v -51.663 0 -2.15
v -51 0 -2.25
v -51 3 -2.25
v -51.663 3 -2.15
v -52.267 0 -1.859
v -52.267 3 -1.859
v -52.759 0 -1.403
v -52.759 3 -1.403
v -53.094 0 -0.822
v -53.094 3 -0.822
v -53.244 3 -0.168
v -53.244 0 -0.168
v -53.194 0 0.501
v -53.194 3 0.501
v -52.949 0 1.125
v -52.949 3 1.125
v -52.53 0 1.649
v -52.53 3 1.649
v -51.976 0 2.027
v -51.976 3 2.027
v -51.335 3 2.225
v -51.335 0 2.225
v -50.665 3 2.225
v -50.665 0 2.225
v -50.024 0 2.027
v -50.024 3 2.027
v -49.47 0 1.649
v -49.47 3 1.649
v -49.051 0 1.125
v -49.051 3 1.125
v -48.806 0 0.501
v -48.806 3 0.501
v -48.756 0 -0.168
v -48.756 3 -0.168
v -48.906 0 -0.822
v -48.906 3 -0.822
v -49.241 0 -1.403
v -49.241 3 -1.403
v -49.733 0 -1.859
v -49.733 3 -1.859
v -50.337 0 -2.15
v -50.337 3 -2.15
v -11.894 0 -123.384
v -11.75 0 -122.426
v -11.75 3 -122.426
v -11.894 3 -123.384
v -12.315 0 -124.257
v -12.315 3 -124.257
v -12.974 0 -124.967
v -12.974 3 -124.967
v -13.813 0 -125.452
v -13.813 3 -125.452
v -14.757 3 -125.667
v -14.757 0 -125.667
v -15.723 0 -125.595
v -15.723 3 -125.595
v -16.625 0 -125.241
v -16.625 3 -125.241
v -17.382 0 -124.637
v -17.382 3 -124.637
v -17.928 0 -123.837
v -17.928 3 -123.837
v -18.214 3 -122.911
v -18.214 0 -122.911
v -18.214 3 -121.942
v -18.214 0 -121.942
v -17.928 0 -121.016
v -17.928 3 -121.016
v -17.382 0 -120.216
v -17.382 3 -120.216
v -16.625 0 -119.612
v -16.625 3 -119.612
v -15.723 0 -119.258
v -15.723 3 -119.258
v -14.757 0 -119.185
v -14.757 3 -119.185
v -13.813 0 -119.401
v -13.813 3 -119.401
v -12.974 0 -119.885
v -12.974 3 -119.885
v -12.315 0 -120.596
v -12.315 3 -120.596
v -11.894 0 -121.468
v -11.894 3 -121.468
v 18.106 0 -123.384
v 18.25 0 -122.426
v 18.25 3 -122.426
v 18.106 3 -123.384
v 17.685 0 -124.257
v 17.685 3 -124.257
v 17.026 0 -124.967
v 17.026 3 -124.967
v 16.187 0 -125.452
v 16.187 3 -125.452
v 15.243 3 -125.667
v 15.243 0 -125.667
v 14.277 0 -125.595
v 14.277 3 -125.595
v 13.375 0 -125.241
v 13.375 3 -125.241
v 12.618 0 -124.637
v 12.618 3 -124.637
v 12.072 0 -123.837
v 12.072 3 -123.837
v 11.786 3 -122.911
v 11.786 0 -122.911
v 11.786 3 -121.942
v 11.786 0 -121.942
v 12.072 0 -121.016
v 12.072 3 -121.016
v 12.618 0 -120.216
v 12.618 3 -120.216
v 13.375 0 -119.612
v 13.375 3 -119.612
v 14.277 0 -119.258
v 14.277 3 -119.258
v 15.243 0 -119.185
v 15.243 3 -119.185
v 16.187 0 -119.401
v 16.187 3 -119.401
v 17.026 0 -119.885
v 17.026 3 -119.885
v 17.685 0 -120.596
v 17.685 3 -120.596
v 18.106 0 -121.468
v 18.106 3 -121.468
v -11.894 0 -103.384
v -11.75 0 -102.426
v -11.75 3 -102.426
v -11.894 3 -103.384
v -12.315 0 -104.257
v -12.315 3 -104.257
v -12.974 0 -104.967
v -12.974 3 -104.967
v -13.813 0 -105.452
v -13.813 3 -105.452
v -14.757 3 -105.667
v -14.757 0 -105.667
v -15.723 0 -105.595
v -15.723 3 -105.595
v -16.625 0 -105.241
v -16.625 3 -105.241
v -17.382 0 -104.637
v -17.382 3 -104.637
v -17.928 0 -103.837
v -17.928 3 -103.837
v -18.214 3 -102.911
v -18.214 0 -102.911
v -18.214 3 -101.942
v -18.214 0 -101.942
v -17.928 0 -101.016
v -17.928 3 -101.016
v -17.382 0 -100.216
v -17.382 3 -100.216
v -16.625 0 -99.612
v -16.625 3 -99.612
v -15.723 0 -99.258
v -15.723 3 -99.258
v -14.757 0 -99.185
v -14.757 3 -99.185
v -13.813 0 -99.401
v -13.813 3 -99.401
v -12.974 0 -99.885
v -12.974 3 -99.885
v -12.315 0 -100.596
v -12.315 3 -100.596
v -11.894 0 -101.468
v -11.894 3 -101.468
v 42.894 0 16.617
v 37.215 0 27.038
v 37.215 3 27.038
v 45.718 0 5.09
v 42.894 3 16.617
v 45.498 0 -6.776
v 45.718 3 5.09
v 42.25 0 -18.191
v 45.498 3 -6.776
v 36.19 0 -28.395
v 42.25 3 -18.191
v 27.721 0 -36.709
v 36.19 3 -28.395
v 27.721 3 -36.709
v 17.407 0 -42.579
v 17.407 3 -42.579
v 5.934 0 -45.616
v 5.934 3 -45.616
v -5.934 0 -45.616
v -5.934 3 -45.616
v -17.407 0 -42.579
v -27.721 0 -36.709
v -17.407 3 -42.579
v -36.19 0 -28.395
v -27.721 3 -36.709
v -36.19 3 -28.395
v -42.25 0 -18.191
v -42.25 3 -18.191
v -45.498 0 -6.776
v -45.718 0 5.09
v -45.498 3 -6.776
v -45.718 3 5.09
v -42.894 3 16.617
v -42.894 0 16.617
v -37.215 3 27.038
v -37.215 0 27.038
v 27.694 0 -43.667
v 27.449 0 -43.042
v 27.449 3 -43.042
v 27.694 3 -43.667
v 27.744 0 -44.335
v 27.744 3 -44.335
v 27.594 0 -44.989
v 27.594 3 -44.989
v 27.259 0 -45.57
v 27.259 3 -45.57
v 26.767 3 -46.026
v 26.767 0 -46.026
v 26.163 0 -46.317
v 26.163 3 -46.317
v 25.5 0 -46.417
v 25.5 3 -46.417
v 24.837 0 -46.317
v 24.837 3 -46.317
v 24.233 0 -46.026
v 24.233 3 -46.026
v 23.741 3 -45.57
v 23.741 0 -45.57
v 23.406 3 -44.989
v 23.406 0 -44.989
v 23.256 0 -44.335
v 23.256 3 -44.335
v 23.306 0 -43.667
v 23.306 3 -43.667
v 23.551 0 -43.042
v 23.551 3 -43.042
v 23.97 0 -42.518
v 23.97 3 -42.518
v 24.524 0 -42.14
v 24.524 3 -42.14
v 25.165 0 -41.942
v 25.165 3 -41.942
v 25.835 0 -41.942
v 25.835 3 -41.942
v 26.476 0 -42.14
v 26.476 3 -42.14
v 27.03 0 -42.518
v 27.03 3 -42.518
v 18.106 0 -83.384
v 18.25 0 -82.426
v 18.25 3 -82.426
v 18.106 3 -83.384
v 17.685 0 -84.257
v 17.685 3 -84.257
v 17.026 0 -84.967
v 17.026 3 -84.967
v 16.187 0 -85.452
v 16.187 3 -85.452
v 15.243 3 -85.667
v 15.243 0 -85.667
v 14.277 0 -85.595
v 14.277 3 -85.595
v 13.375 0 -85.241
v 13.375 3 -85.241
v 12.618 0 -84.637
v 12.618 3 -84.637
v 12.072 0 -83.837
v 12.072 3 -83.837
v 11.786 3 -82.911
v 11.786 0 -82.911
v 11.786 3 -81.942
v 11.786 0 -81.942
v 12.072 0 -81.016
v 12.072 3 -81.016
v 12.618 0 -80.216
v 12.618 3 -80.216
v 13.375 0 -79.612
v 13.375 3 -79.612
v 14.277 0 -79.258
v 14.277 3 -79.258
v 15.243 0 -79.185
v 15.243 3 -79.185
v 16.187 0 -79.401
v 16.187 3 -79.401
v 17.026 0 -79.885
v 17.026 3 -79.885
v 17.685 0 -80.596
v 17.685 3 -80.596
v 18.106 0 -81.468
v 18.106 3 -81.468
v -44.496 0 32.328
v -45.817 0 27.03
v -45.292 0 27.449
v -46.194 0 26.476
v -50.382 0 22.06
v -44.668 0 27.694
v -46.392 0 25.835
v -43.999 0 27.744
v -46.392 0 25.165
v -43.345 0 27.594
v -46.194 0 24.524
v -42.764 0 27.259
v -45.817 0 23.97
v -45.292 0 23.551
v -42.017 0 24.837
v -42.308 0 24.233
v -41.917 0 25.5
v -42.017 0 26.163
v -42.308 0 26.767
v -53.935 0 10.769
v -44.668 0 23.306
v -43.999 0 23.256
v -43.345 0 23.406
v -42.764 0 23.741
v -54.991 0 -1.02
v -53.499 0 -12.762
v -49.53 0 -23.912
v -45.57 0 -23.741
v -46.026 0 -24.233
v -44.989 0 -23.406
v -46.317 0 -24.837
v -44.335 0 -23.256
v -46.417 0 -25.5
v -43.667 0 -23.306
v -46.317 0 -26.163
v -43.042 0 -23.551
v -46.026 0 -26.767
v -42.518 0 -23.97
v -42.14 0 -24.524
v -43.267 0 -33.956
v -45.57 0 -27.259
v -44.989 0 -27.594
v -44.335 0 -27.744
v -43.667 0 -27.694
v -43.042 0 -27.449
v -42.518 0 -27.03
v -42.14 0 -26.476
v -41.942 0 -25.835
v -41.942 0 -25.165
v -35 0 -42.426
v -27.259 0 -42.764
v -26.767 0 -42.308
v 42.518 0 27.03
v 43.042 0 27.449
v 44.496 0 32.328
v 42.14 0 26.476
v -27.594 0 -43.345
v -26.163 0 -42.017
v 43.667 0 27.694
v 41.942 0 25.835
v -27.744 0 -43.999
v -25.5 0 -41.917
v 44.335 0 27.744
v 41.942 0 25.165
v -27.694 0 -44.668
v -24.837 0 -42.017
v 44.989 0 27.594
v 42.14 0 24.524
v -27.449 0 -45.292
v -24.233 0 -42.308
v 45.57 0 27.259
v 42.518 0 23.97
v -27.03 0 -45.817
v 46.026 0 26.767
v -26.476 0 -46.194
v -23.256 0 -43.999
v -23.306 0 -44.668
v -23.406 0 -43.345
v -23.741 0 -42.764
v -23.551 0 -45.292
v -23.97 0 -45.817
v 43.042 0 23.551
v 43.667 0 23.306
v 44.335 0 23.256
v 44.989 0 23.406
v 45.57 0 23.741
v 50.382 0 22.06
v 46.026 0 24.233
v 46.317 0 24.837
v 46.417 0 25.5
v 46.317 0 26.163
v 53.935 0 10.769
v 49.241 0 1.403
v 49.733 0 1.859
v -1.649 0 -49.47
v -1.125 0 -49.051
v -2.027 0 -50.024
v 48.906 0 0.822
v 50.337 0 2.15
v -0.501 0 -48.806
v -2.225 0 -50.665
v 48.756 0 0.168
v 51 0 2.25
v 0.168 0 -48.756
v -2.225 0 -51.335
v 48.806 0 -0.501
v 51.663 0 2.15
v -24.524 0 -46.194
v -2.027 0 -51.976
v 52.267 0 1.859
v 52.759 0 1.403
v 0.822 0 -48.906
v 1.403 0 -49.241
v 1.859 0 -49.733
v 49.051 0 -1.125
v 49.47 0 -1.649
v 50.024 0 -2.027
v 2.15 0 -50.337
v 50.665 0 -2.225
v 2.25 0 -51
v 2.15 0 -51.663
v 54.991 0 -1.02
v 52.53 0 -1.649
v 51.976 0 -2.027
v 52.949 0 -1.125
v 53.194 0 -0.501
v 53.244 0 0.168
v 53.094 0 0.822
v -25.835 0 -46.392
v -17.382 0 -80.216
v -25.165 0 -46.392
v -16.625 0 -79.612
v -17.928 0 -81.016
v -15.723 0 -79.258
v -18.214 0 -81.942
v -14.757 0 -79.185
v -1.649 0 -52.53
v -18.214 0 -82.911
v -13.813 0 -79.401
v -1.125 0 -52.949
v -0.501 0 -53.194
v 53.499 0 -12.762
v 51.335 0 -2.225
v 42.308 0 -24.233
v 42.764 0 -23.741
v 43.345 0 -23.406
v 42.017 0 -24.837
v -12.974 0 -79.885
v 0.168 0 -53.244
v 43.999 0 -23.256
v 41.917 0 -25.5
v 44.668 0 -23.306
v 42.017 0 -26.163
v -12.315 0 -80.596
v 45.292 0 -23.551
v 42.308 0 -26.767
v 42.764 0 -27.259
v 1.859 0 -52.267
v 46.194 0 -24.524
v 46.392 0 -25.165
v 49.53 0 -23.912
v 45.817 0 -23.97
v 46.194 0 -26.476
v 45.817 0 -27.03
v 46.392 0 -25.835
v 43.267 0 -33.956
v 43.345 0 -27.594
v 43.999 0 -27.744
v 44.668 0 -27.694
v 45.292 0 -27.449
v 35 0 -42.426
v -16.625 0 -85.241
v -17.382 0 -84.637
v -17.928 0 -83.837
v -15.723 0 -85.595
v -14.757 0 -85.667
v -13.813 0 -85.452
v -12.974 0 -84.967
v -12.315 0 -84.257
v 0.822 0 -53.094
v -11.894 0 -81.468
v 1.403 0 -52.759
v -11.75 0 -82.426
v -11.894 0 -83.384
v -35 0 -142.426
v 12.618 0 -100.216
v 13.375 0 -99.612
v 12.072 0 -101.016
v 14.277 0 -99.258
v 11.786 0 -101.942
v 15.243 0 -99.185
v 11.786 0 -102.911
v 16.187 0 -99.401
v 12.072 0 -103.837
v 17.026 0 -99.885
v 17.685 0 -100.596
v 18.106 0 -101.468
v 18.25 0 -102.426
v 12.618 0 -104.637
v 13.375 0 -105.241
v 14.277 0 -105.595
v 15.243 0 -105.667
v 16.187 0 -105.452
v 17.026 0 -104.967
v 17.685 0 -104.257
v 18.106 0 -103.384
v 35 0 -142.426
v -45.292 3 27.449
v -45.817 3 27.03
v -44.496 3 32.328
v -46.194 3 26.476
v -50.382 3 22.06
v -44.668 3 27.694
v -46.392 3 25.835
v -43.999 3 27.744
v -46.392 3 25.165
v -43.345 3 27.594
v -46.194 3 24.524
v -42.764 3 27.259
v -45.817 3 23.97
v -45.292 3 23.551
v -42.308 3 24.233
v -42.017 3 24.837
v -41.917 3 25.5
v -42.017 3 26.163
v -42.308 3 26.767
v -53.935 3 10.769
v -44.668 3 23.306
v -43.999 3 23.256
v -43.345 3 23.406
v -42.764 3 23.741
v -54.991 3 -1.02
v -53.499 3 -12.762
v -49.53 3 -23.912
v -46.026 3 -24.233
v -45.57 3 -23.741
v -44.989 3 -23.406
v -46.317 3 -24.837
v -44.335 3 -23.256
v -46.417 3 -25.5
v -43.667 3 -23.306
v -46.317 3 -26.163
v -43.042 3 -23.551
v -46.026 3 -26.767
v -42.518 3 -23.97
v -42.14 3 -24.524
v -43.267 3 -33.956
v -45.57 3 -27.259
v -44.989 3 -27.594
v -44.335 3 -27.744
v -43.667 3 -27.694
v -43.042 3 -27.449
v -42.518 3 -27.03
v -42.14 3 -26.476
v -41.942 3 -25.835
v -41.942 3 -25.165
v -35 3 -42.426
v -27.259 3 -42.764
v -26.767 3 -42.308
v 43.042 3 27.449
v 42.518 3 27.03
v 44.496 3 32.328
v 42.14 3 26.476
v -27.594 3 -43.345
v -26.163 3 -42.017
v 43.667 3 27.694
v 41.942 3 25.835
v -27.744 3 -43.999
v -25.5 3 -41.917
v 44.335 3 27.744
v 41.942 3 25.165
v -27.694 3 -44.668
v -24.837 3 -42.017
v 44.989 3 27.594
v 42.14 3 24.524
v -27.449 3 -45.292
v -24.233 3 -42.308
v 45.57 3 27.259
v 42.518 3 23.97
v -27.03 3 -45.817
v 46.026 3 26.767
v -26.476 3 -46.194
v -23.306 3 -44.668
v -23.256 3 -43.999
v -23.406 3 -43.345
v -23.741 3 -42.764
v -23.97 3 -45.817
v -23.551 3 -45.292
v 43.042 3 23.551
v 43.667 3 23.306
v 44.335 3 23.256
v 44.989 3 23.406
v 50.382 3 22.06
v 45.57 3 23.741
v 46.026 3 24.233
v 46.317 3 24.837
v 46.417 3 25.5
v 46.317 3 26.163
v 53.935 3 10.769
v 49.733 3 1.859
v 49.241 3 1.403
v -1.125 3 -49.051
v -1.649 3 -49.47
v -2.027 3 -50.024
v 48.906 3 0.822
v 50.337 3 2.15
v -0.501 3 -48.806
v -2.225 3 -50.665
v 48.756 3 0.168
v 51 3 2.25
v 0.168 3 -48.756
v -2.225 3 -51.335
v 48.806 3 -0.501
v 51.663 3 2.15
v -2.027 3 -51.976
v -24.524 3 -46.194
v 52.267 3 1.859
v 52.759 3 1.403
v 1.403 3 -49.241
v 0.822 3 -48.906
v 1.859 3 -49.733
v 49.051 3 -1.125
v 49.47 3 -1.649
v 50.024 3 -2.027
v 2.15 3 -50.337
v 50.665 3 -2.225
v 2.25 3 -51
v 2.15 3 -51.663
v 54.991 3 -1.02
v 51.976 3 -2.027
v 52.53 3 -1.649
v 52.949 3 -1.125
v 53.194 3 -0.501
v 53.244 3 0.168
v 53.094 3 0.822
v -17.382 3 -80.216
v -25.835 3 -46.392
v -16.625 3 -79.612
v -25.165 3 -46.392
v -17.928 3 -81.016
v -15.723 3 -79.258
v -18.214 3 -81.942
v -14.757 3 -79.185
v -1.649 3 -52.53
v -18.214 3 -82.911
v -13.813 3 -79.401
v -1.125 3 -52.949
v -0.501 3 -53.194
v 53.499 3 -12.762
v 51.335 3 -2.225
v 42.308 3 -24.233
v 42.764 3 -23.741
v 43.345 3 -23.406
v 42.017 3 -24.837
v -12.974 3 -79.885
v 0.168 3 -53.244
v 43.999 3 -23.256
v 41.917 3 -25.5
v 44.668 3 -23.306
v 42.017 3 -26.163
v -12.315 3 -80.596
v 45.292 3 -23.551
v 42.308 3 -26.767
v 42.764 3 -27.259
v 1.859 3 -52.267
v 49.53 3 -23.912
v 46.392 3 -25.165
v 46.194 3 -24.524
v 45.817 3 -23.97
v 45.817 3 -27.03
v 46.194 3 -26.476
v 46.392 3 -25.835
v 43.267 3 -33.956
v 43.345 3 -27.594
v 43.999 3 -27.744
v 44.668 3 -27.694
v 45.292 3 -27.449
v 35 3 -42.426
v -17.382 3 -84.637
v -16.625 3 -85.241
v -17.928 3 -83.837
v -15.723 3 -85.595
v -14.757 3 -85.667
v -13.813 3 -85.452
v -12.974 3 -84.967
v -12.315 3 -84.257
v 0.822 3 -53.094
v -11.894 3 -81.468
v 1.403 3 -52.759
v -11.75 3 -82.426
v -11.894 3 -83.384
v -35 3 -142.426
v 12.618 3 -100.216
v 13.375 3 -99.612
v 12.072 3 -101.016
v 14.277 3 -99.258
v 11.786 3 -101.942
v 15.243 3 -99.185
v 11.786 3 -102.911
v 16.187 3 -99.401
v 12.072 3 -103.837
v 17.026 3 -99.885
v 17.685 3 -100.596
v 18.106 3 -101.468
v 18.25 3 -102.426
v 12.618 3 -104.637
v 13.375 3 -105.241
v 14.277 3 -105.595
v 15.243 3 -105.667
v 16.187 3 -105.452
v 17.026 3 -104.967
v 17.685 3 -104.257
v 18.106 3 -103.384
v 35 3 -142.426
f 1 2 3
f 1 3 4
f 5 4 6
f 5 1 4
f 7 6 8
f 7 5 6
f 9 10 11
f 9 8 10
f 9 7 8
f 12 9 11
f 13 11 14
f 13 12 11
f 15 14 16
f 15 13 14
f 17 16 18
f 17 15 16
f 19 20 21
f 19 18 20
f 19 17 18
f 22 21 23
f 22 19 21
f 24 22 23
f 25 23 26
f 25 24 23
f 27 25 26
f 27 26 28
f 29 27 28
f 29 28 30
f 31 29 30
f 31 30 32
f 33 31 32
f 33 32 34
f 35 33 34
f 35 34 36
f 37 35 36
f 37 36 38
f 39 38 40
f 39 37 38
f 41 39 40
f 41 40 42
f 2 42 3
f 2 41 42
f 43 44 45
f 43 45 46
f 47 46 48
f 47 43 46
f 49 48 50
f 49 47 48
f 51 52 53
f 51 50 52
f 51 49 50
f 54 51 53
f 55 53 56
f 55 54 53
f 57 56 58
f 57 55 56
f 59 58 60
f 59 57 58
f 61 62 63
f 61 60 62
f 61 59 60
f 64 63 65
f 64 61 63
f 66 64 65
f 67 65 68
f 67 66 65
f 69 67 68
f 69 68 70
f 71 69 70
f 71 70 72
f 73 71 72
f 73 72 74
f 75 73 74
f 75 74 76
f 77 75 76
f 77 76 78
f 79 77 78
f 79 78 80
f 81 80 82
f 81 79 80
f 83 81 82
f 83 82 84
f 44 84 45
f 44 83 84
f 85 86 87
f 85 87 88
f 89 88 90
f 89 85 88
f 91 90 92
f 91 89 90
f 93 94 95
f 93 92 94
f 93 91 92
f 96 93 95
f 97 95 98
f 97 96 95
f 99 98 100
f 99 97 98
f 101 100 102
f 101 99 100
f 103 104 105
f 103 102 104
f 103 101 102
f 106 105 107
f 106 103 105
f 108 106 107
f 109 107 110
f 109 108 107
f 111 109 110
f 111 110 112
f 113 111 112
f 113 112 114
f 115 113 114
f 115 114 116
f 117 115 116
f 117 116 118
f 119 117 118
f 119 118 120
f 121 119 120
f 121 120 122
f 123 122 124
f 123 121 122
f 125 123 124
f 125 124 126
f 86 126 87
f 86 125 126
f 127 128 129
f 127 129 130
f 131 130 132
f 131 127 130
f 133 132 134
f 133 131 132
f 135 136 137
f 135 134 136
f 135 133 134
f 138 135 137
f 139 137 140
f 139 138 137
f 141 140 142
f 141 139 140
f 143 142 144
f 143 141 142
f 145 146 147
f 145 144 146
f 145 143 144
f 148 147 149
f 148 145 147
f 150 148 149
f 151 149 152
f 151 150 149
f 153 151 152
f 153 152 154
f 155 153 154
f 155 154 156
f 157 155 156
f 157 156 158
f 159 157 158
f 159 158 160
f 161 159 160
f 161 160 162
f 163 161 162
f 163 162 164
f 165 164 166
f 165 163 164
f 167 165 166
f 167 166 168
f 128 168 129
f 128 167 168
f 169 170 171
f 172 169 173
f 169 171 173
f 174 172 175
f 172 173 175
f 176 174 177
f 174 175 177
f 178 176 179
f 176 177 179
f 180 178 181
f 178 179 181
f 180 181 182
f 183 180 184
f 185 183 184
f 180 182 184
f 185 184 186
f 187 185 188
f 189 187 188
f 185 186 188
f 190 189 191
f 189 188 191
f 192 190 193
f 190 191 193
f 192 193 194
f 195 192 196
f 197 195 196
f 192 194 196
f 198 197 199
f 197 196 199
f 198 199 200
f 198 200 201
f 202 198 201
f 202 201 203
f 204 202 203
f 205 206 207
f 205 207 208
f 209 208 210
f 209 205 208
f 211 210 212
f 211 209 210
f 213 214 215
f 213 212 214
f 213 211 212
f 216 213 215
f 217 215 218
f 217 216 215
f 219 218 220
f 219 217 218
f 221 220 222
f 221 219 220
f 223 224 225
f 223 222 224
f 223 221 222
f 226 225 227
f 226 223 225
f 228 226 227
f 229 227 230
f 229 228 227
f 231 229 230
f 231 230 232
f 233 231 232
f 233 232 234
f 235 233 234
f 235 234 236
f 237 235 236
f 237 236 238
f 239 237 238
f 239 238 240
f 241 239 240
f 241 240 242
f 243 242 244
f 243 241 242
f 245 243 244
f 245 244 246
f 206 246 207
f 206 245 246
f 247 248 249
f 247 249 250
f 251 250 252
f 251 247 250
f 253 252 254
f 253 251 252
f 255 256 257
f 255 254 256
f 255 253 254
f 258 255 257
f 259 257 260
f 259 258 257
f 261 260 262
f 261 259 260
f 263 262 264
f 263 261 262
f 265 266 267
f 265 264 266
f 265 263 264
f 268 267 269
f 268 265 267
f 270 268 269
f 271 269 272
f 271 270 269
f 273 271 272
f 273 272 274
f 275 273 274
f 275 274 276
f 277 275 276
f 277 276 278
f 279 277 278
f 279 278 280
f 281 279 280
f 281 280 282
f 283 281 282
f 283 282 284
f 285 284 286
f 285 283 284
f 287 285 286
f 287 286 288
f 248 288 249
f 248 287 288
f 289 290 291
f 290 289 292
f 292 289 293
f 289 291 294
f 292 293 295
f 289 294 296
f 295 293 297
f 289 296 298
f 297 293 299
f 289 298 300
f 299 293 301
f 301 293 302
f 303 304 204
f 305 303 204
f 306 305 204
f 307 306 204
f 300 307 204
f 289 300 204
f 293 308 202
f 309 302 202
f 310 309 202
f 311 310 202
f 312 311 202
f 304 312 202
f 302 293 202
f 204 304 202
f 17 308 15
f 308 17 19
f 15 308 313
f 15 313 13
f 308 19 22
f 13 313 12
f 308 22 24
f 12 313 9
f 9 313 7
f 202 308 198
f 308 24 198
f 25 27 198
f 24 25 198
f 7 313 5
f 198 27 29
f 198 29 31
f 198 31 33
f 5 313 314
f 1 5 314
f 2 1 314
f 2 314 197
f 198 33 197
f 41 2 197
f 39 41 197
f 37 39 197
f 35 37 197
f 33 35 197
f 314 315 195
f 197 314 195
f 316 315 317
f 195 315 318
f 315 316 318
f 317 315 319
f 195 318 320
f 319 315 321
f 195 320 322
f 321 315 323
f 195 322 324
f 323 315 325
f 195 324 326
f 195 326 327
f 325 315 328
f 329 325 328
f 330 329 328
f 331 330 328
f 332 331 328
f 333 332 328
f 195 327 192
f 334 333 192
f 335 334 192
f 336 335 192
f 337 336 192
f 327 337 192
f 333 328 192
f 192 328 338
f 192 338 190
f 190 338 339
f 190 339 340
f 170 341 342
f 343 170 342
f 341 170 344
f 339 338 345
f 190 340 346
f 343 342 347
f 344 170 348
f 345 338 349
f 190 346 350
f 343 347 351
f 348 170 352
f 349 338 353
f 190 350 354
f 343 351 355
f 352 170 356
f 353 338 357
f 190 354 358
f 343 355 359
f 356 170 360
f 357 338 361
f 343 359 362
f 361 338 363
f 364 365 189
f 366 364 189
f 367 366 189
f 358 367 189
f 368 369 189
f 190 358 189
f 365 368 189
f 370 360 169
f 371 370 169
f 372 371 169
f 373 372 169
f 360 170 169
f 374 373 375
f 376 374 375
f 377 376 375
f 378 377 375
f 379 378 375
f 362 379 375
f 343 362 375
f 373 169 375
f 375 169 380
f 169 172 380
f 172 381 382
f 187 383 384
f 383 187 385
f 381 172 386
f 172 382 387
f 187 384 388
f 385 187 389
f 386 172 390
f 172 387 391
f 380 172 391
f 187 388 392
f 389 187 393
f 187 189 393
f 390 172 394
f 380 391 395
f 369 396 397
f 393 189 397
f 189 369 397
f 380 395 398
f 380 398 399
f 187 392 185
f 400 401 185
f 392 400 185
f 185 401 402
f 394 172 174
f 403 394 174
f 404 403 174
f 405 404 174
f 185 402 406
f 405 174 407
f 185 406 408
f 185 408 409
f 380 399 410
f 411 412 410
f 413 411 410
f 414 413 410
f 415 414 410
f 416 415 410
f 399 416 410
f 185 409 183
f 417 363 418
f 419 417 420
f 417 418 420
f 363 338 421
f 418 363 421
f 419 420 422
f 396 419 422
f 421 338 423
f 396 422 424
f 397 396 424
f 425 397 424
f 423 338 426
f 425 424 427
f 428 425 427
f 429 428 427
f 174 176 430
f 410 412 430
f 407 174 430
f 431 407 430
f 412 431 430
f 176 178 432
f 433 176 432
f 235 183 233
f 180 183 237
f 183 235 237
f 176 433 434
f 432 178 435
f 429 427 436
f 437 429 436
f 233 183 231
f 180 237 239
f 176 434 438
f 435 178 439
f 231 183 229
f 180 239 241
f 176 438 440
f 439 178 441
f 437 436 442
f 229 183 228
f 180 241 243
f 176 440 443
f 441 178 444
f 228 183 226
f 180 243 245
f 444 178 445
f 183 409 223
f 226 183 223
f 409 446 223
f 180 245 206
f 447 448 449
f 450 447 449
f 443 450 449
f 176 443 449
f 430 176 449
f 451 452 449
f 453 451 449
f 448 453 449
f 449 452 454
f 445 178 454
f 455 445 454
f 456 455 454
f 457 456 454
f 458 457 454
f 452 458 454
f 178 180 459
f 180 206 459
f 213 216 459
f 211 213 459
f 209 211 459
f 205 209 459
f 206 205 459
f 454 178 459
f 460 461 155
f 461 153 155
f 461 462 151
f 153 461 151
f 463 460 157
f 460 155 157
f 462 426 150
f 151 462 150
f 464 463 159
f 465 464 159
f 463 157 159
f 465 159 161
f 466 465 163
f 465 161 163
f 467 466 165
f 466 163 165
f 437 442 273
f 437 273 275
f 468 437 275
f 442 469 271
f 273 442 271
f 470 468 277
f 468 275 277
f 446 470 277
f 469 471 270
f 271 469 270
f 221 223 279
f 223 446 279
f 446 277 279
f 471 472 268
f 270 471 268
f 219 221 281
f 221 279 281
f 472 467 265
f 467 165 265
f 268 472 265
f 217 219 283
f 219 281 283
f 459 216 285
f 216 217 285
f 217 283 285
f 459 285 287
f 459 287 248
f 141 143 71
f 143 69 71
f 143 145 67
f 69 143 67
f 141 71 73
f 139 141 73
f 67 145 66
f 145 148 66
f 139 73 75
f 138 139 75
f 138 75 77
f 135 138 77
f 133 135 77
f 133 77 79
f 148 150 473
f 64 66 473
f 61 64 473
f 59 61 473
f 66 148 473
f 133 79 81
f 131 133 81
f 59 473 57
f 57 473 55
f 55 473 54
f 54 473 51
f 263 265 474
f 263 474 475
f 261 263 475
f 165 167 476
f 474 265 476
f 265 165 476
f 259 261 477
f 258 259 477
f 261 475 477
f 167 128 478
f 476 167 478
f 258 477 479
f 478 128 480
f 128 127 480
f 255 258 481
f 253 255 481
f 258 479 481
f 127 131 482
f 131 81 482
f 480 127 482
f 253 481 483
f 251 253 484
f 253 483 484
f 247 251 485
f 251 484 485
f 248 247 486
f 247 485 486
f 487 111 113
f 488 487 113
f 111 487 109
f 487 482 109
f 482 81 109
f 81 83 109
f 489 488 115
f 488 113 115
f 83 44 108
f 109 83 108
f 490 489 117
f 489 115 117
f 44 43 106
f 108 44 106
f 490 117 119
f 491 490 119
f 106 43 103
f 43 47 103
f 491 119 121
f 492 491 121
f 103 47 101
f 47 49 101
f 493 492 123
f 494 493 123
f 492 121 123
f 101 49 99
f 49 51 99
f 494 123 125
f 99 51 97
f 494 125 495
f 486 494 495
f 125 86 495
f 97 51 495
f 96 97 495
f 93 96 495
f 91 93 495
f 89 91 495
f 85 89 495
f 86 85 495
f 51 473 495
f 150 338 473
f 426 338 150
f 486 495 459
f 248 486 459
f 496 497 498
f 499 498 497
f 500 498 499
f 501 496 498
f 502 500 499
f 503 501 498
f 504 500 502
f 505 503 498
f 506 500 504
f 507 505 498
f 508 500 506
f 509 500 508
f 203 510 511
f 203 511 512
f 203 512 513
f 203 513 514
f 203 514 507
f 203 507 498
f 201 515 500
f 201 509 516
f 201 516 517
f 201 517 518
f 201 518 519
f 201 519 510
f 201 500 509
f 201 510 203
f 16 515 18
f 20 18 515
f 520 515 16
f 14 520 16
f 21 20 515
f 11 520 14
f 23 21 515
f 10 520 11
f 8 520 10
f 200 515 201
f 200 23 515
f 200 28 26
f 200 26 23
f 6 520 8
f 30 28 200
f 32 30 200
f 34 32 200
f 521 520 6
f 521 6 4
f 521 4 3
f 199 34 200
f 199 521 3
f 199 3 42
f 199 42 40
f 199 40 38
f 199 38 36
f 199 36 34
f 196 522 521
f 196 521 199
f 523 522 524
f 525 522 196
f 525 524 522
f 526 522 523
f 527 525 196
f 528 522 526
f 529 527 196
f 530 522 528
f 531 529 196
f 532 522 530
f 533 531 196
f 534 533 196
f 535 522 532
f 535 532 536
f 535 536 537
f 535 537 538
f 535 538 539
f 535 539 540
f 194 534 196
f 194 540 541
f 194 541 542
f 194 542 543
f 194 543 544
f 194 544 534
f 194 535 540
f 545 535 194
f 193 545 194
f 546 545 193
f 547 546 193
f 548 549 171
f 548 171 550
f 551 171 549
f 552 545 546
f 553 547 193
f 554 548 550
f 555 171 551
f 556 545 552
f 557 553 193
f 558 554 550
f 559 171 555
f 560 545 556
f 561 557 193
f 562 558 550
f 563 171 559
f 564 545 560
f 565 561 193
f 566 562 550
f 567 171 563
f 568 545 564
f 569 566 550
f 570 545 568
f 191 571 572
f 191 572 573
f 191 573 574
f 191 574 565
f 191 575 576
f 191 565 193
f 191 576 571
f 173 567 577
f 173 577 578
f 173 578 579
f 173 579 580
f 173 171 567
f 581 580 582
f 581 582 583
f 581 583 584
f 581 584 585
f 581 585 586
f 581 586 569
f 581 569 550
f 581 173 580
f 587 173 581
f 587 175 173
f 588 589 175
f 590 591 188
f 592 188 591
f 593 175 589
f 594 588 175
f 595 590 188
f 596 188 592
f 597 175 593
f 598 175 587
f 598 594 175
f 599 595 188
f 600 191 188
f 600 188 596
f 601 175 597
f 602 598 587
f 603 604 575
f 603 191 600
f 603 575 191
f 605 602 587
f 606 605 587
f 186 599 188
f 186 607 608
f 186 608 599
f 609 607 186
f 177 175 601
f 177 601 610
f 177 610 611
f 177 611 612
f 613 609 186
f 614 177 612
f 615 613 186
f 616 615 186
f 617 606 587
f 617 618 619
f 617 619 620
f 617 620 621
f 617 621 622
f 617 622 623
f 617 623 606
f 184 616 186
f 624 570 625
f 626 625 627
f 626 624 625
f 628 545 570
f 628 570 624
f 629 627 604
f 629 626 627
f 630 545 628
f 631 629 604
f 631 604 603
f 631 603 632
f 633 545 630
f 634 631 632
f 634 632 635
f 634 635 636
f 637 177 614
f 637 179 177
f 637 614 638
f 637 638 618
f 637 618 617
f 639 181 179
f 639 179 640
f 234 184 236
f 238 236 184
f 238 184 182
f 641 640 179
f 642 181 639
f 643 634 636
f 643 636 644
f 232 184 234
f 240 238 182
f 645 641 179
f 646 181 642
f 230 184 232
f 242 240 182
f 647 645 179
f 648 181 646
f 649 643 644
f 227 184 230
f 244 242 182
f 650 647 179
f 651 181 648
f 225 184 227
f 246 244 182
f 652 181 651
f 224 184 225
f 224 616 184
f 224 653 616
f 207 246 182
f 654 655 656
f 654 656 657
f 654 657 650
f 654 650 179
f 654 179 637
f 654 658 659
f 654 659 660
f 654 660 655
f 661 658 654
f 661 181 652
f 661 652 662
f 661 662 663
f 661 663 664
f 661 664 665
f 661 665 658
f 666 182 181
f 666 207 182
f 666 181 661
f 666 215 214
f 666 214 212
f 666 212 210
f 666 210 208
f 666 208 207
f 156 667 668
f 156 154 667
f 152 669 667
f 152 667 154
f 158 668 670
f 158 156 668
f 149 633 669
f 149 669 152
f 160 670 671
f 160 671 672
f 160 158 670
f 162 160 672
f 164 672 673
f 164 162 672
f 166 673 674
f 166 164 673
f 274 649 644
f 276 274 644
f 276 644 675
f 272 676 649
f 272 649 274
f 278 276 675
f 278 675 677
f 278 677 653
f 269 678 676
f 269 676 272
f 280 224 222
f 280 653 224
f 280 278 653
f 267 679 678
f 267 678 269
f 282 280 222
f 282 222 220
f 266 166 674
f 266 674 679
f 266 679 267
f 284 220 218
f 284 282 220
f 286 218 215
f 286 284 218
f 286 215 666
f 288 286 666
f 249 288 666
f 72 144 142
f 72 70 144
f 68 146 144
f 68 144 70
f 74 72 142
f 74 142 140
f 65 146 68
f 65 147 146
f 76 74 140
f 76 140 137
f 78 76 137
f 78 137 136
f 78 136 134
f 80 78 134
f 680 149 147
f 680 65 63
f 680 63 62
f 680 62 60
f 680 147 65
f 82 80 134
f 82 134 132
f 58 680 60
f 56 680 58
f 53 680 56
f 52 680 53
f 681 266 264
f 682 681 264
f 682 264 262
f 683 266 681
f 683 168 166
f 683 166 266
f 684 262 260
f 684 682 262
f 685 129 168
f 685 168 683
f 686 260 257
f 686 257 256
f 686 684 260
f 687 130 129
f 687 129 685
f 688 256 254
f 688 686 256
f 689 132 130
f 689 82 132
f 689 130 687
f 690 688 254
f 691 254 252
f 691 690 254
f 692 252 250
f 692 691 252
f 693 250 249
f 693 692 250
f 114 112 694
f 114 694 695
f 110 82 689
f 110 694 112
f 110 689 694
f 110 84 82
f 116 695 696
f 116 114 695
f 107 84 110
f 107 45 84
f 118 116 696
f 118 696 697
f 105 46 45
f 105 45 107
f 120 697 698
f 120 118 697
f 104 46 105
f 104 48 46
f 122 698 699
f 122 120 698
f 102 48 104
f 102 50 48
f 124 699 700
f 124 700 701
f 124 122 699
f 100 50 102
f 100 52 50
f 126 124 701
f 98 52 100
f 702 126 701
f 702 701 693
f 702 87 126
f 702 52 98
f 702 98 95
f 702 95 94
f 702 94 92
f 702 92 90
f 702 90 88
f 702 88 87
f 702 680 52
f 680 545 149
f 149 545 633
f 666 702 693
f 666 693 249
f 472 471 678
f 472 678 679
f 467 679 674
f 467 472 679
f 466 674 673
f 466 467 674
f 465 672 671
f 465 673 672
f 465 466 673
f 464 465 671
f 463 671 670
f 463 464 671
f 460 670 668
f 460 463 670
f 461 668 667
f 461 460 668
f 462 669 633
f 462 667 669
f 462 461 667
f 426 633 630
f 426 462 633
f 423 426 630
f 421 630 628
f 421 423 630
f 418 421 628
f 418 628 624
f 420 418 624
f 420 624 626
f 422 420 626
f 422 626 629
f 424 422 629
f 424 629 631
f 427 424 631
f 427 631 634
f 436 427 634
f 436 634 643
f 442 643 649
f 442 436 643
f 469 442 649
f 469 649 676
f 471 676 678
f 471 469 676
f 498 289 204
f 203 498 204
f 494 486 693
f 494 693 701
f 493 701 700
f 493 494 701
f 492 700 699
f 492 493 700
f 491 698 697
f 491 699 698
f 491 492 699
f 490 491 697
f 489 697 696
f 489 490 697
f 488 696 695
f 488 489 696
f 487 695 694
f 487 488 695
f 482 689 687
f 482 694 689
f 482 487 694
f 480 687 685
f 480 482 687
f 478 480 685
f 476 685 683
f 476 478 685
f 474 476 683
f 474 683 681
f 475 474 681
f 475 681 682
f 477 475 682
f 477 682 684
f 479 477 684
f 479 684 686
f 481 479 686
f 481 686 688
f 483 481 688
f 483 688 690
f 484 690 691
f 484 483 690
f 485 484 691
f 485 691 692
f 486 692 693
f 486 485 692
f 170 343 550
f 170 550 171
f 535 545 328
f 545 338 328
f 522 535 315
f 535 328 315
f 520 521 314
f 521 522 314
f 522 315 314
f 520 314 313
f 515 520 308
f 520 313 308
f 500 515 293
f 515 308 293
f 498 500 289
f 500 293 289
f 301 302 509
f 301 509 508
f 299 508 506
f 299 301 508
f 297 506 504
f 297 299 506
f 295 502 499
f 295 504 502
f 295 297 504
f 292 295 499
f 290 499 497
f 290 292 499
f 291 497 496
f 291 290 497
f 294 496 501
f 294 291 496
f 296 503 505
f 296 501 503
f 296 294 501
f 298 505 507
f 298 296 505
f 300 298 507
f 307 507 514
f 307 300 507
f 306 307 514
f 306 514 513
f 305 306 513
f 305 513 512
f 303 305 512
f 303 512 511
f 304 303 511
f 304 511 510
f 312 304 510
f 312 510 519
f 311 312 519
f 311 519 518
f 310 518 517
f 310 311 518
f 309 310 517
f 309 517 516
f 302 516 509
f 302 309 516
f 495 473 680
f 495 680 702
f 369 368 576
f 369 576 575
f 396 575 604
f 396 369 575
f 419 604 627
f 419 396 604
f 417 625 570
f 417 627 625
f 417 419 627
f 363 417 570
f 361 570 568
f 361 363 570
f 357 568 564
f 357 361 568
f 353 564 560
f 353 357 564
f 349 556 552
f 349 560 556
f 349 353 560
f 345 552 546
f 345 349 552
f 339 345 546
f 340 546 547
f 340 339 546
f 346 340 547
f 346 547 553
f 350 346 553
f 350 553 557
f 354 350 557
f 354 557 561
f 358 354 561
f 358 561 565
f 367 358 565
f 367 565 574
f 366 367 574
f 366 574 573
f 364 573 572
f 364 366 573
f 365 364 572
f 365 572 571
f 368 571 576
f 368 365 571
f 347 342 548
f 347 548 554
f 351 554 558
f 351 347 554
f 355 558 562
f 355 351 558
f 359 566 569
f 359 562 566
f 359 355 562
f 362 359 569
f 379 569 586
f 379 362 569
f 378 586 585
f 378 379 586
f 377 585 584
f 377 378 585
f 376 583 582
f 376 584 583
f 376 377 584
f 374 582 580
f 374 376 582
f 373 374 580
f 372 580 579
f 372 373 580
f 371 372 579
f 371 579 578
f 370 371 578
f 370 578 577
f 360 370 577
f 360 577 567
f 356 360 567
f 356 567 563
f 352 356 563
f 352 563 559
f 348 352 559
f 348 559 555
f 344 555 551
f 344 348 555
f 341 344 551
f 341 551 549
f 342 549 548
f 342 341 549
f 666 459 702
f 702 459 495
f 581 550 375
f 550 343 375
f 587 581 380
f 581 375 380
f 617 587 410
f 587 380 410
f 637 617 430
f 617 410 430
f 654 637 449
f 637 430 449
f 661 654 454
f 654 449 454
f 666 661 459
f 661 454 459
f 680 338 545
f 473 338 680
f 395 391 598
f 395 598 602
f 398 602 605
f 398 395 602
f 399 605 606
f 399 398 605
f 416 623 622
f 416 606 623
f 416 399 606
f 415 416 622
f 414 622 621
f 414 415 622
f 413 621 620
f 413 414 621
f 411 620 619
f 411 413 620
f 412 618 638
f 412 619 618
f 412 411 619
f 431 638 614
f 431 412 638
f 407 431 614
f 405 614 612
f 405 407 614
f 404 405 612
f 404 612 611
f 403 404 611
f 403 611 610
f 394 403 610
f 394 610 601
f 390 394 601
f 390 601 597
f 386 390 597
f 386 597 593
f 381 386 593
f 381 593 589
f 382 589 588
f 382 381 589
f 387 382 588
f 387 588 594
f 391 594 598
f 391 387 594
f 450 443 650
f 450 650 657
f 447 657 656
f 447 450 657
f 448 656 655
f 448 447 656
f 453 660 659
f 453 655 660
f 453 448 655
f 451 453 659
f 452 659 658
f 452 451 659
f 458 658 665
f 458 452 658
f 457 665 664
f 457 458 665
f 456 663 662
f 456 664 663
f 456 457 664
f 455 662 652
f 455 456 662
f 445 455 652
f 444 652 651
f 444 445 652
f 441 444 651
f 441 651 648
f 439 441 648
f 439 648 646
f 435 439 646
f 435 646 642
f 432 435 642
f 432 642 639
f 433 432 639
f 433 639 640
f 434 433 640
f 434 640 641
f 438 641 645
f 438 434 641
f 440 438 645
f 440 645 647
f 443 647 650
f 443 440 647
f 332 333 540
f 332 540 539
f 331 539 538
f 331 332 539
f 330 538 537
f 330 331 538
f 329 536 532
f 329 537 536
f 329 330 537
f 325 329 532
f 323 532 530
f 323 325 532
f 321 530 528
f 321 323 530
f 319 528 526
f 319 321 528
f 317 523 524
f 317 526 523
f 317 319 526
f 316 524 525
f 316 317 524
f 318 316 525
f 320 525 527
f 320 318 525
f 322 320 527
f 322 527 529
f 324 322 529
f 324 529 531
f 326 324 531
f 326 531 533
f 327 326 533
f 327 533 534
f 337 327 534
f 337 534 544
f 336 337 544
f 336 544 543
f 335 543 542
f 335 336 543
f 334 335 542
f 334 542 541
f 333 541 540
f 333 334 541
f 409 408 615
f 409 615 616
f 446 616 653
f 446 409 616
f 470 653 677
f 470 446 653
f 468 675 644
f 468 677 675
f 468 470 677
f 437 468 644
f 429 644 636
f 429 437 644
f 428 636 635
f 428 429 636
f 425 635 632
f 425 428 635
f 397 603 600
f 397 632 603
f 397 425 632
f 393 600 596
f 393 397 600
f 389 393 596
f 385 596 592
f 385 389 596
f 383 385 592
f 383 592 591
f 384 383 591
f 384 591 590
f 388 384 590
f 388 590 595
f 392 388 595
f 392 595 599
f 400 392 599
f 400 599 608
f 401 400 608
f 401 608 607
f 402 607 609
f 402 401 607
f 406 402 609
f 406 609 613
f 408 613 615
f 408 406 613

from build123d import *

# Parameters (mm, degrees)
SKETCH1_R               = 55
BOSS_EXTRUDE1_DEPTH     = 3
SKETCH2_W               = 70
SKETCH2_H               = 100
BOSS_EXTRUDE2_DEPTH     = 3
SKETCH4_R               = 46
CUT_EXTRUDE2_DEPTH      = 1
CUT_EXTRUDE2_DEPTH_BACK = 4
CUT_EXTRUDE5_START      = -4
CUT_EXTRUDE5_DEPTH      = 5
CUT_EXTRUDE3_START      = -4
SKETCH5_R               = 2.25
CUT_EXTRUDE3_DEPTH      = 5
CIRPATTERN1_COUNT       = 12
CUT_EXTRUDE4_START      = -4
SKETCH6_R               = 3.25
CUT_EXTRUDE4_DEPTH      = 5
LPATTERN1_COUNT         = 3
LPATTERN1_PITCH         = 20


with BuildPart() as part:
    # Sketch1 → Boss-Extrude1 (new body)
    with BuildSketch(Plane(origin=(0, 0, 0), x_dir=(1, 0, 0), z_dir=(0, 1, 0))):
        Circle(SKETCH1_R)
    extrude(amount=BOSS_EXTRUDE1_DEPTH)

    # Sketch2 → Boss-Extrude2 (add)
    with BuildSketch(Plane(origin=(0, 0, 0), x_dir=(1, 0, 0), z_dir=(0, 1, 0))):
        with Locations((0, 92.426406871)):
            Rectangle(SKETCH2_W, SKETCH2_H)
    extrude(amount=BOSS_EXTRUDE2_DEPTH)

    # Sketch4 → Cut-Extrude2 (cut, two sides)
    with BuildSketch(Plane(origin=(0, 3, 0), x_dir=(1, 0, 0), z_dir=(0, 1, 0))) as cut_extrude2_sk:
        Circle(SKETCH4_R)
    extrude(amount=CUT_EXTRUDE2_DEPTH, mode=Mode.SUBTRACT)
    extrude(cut_extrude2_sk.sketch, amount=-CUT_EXTRUDE2_DEPTH_BACK, mode=Mode.SUBTRACT)

    # Sketch7 → Cut-Extrude5 (cut)
    with BuildSketch(Plane(origin=(0, 3, 0), x_dir=(1, 0, 0), z_dir=(0, 1, 0)).offset(CUT_EXTRUDE5_START)):
        with BuildLine():
            Line((0, 0), (0, -55))
            ThreePointArc((0, -55), (-24.969477486, -49.00535883), (-44.495934691, -32.328188876))
            Line((-44.495934691, -32.328188876), (0, 0))
        make_face()
    cut_extrude5 = extrude(amount=CUT_EXTRUDE5_DEPTH, mode=Mode.SUBTRACT)

    # Mirror1: Cut-Extrude5 across plane
    add(cut_extrude5.mirror(Plane(origin=(0, 0, 0), x_dir=(0, 0, 1), z_dir=(1, 0, 0))), mode=Mode.SUBTRACT)

    # Sketch5 → Cut-Extrude3 (cut)
    with BuildSketch(Plane(origin=(0, 3, 0), x_dir=(1, 0, 0), z_dir=(0, 1, 0)).offset(CUT_EXTRUDE3_START)):
        with Locations((0, 51)):
            Circle(SKETCH5_R)
    cut_extrude3 = extrude(amount=CUT_EXTRUDE3_DEPTH, mode=Mode.SUBTRACT)

    # CirPattern1: Cut-Extrude3 ×12 about axis
    cirpattern1_axis = Axis((0, 0, 0), (0, 1, 0))
    for i in range(1, CIRPATTERN1_COUNT):
        add(cut_extrude3.rotate(cirpattern1_axis, i * 360 / CIRPATTERN1_COUNT), mode=Mode.SUBTRACT)

    # Sketch6 → Cut-Extrude4 (cut)
    with BuildSketch(Plane(origin=(0, 3, 0), x_dir=(1, 0, 0), z_dir=(0, 1, 0)).offset(CUT_EXTRUDE4_START)):
        with Locations((15, 122.426406871)):
            Circle(SKETCH6_R)
        with Locations((-15, 122.426406871)):
            Circle(SKETCH6_R)
    cut_extrude4 = extrude(amount=CUT_EXTRUDE4_DEPTH, mode=Mode.SUBTRACT)

    # LPattern1: Cut-Extrude4 ×3
    with Locations(*[(0, 0, i * LPATTERN1_PITCH) for i in range(1, LPATTERN1_COUNT)]):
        add(cut_extrude4, mode=Mode.SUBTRACT)


solid = part.part
